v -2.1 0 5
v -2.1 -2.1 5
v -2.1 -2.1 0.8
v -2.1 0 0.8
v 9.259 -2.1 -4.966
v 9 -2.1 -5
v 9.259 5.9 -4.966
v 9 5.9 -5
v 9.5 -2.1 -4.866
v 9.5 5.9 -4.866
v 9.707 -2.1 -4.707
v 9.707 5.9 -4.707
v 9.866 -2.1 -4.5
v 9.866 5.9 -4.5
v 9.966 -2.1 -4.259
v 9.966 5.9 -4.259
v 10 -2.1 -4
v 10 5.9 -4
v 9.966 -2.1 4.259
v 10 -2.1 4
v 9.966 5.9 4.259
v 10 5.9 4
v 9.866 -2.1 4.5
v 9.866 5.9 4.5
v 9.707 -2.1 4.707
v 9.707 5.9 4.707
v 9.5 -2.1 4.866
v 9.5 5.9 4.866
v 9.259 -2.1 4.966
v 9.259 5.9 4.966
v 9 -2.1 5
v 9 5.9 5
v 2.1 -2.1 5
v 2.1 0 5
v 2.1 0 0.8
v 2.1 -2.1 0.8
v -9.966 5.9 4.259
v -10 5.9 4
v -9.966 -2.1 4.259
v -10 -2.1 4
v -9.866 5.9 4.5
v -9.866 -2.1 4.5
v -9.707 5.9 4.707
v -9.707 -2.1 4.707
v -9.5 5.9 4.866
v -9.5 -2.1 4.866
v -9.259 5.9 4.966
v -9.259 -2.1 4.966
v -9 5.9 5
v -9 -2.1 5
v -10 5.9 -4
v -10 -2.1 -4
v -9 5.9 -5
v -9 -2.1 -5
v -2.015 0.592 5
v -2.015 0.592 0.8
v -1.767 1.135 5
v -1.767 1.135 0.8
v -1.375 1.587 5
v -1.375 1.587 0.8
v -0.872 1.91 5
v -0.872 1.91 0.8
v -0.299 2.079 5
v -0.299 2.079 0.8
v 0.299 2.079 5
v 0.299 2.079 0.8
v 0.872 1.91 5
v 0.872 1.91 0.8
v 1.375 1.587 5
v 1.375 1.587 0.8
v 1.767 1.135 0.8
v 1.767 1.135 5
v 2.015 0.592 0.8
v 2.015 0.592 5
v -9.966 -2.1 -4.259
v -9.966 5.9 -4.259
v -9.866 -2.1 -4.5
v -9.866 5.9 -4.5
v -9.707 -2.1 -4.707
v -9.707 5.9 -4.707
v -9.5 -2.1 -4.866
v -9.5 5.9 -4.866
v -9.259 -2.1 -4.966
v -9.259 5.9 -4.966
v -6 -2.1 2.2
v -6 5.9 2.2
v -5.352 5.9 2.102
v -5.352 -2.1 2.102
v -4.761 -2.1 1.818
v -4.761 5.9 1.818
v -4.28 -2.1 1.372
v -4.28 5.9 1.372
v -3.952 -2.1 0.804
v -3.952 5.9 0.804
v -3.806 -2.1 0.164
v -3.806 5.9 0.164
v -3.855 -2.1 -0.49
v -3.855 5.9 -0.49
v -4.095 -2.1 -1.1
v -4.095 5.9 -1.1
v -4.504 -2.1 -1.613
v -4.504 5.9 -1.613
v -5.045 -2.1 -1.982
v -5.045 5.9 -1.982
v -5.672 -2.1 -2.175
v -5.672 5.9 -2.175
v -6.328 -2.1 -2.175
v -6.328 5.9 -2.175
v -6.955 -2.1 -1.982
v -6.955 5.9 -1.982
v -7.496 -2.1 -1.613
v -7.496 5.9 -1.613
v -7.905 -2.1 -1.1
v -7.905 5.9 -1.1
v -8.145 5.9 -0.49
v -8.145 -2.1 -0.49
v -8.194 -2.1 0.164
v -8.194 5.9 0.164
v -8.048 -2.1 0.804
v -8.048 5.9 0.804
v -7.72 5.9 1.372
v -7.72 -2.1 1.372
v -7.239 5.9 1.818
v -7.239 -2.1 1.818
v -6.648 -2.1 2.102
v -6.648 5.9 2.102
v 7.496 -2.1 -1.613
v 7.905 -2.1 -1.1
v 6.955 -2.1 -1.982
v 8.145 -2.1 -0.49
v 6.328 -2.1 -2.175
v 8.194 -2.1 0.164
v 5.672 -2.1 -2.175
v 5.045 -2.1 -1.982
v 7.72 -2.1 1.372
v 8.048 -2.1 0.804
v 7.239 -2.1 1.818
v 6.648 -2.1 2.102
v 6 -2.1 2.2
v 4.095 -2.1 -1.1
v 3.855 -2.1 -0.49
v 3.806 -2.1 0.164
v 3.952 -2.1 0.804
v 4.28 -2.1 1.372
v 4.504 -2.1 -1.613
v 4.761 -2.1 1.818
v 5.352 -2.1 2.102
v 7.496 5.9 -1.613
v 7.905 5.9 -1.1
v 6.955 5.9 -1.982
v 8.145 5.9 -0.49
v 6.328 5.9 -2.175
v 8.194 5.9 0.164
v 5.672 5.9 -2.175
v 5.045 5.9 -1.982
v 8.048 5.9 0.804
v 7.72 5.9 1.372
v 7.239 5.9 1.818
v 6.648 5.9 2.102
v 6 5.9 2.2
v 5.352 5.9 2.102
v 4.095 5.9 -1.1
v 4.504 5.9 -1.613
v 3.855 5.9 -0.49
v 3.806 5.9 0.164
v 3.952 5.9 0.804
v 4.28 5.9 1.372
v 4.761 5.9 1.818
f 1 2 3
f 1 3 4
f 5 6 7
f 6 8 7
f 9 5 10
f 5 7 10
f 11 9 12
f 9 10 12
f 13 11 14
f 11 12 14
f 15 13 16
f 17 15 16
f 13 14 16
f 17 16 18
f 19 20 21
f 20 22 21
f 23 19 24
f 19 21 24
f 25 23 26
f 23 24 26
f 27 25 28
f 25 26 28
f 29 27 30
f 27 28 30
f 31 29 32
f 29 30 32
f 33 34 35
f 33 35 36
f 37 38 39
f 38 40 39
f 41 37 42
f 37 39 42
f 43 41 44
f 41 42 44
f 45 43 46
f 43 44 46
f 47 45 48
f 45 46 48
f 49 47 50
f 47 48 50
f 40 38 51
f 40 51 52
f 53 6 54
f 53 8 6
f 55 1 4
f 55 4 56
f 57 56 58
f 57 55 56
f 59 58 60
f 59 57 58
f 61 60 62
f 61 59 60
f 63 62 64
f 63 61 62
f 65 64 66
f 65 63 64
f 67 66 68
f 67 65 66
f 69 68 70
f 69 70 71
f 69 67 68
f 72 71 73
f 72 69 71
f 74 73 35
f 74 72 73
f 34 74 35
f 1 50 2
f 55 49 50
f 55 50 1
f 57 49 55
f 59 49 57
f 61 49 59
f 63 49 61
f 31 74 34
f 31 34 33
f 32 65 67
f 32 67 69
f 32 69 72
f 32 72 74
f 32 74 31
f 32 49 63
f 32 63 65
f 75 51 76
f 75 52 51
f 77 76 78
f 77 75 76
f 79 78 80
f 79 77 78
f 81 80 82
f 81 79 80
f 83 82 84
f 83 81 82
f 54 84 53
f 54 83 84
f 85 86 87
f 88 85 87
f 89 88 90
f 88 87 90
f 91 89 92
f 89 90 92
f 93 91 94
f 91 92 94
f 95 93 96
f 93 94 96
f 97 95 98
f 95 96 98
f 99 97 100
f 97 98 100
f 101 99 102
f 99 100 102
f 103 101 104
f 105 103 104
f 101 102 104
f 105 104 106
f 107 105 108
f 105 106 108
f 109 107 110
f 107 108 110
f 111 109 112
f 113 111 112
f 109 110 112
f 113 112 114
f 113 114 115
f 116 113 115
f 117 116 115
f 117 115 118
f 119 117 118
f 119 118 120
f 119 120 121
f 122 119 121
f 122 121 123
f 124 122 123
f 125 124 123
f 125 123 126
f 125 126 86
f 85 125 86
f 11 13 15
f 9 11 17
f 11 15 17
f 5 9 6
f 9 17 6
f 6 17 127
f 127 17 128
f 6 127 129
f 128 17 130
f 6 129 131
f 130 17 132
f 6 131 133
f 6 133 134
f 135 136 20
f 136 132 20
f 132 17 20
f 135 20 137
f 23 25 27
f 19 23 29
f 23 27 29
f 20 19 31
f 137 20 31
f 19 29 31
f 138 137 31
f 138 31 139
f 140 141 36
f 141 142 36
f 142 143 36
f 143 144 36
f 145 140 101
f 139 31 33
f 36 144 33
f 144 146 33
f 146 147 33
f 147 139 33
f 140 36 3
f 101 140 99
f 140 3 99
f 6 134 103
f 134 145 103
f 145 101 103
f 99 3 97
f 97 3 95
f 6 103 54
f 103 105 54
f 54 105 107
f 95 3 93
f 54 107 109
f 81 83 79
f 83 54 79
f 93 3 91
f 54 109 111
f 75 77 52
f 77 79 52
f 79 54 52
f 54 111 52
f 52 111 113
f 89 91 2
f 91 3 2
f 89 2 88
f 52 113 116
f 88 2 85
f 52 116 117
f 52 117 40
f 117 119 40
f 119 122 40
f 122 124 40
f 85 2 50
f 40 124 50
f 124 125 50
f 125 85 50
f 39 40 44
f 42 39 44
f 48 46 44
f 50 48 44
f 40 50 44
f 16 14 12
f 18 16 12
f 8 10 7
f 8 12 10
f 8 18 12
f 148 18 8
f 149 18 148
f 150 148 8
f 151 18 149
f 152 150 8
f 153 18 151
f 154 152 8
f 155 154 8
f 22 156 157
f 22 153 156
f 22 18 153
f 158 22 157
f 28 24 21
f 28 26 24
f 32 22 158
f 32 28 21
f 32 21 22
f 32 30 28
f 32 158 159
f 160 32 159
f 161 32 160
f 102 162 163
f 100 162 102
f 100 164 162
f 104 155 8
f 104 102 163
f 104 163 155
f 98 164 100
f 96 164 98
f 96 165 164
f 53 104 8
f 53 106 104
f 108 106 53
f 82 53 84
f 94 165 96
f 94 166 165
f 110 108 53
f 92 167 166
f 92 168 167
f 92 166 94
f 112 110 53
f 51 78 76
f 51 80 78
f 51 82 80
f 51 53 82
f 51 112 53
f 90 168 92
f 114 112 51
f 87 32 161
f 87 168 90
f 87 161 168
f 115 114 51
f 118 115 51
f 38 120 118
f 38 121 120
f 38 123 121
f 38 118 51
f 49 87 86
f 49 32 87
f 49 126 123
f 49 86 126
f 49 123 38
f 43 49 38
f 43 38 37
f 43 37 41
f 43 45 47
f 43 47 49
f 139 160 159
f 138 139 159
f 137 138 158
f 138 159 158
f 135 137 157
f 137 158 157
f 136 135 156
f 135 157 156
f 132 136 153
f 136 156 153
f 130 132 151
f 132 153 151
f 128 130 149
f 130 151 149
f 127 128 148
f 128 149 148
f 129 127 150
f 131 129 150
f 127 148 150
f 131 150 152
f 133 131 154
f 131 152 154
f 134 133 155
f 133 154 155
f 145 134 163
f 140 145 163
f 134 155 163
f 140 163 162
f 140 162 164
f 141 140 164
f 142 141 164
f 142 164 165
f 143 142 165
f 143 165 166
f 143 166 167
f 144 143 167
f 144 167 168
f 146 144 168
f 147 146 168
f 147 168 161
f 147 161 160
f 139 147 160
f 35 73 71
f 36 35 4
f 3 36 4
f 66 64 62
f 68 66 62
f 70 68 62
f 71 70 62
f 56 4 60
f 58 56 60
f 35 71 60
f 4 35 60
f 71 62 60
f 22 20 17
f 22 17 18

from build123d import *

# Parameters (mm, degrees)
EXTRUDE_1_DEPTH     = 5
SKETCH_2_R          = 2.2
CUT_EXTRUDE_1_DEPTH = 14.747727085
EXTRUDE_START       = -5.8
EXTRUDE_2_DEPTH     = 5.8
FILLET_1_R          = 1


with BuildPart() as part:
    # 草图1 → 凸台-拉伸1 (new, symmetric)
    with BuildSketch(Plane.XY):
        with BuildLine():
            Line((2.1, -2.1), (10, -2.1))
            Line((10, -2.1), (10, 5.9))
            Line((10, 5.9), (-10, 5.9))
            Line((-10, 5.9), (-10, -2.1))
            Line((-10, -2.1), (-2.1, -2.1))
            Line((-2.1, -2.1), (-2.1, 0))
            ThreePointArc((-2.1, 0), (0, 2.1), (2.1, 0))
            Line((2.1, 0), (2.1, -2.1))
        make_face()
    extrude(amount=EXTRUDE_1_DEPTH, both=True)

    # 草图2 → 切除-拉伸1 (cut, through all)
    with BuildSketch(Plane(origin=(0, 5.9, 0), x_dir=(1, 0, 0), z_dir=(0, 1, 0))):
        with Locations(Location((-6, 0, 0), (0, 0, 270))):
            Circle(SKETCH_2_R)
        with Locations(Location((6, 0, 0), (0, 0, 270))):
            Circle(SKETCH_2_R)
    extrude(amount=-CUT_EXTRUDE_1_DEPTH, mode=Mode.SUBTRACT)

    # 草图3 → 凸台-拉伸2 (add)
    with BuildSketch(Plane(origin=(0, 0, -5), x_dir=(-1, 0, 0), z_dir=(0, 0, -1)).offset(EXTRUDE_START)):
        with BuildLine():
            Line((2.1, -2.1), (2.1, 0))
            ThreePointArc((2.1, 0), (0, 2.1), (-2.1, 0))
            Line((-2.1, 0), (-2.1, -2.1))
            Line((-2.1, -2.1), (2.1, -2.1))
        make_face()
    extrude(amount=EXTRUDE_2_DEPTH)

    # 圆角1
    fillet_1_edges = [part.edges().sort_by_distance(p)[0] for p in [
        (-10, 1.9, -5),
        (10, 1.9, 5),
        (-10, 1.9, 5),
        (10, 1.9, -5),
    ]]
    fillet(fillet_1_edges, radius=FILLET_1_R)


solid = part.part
